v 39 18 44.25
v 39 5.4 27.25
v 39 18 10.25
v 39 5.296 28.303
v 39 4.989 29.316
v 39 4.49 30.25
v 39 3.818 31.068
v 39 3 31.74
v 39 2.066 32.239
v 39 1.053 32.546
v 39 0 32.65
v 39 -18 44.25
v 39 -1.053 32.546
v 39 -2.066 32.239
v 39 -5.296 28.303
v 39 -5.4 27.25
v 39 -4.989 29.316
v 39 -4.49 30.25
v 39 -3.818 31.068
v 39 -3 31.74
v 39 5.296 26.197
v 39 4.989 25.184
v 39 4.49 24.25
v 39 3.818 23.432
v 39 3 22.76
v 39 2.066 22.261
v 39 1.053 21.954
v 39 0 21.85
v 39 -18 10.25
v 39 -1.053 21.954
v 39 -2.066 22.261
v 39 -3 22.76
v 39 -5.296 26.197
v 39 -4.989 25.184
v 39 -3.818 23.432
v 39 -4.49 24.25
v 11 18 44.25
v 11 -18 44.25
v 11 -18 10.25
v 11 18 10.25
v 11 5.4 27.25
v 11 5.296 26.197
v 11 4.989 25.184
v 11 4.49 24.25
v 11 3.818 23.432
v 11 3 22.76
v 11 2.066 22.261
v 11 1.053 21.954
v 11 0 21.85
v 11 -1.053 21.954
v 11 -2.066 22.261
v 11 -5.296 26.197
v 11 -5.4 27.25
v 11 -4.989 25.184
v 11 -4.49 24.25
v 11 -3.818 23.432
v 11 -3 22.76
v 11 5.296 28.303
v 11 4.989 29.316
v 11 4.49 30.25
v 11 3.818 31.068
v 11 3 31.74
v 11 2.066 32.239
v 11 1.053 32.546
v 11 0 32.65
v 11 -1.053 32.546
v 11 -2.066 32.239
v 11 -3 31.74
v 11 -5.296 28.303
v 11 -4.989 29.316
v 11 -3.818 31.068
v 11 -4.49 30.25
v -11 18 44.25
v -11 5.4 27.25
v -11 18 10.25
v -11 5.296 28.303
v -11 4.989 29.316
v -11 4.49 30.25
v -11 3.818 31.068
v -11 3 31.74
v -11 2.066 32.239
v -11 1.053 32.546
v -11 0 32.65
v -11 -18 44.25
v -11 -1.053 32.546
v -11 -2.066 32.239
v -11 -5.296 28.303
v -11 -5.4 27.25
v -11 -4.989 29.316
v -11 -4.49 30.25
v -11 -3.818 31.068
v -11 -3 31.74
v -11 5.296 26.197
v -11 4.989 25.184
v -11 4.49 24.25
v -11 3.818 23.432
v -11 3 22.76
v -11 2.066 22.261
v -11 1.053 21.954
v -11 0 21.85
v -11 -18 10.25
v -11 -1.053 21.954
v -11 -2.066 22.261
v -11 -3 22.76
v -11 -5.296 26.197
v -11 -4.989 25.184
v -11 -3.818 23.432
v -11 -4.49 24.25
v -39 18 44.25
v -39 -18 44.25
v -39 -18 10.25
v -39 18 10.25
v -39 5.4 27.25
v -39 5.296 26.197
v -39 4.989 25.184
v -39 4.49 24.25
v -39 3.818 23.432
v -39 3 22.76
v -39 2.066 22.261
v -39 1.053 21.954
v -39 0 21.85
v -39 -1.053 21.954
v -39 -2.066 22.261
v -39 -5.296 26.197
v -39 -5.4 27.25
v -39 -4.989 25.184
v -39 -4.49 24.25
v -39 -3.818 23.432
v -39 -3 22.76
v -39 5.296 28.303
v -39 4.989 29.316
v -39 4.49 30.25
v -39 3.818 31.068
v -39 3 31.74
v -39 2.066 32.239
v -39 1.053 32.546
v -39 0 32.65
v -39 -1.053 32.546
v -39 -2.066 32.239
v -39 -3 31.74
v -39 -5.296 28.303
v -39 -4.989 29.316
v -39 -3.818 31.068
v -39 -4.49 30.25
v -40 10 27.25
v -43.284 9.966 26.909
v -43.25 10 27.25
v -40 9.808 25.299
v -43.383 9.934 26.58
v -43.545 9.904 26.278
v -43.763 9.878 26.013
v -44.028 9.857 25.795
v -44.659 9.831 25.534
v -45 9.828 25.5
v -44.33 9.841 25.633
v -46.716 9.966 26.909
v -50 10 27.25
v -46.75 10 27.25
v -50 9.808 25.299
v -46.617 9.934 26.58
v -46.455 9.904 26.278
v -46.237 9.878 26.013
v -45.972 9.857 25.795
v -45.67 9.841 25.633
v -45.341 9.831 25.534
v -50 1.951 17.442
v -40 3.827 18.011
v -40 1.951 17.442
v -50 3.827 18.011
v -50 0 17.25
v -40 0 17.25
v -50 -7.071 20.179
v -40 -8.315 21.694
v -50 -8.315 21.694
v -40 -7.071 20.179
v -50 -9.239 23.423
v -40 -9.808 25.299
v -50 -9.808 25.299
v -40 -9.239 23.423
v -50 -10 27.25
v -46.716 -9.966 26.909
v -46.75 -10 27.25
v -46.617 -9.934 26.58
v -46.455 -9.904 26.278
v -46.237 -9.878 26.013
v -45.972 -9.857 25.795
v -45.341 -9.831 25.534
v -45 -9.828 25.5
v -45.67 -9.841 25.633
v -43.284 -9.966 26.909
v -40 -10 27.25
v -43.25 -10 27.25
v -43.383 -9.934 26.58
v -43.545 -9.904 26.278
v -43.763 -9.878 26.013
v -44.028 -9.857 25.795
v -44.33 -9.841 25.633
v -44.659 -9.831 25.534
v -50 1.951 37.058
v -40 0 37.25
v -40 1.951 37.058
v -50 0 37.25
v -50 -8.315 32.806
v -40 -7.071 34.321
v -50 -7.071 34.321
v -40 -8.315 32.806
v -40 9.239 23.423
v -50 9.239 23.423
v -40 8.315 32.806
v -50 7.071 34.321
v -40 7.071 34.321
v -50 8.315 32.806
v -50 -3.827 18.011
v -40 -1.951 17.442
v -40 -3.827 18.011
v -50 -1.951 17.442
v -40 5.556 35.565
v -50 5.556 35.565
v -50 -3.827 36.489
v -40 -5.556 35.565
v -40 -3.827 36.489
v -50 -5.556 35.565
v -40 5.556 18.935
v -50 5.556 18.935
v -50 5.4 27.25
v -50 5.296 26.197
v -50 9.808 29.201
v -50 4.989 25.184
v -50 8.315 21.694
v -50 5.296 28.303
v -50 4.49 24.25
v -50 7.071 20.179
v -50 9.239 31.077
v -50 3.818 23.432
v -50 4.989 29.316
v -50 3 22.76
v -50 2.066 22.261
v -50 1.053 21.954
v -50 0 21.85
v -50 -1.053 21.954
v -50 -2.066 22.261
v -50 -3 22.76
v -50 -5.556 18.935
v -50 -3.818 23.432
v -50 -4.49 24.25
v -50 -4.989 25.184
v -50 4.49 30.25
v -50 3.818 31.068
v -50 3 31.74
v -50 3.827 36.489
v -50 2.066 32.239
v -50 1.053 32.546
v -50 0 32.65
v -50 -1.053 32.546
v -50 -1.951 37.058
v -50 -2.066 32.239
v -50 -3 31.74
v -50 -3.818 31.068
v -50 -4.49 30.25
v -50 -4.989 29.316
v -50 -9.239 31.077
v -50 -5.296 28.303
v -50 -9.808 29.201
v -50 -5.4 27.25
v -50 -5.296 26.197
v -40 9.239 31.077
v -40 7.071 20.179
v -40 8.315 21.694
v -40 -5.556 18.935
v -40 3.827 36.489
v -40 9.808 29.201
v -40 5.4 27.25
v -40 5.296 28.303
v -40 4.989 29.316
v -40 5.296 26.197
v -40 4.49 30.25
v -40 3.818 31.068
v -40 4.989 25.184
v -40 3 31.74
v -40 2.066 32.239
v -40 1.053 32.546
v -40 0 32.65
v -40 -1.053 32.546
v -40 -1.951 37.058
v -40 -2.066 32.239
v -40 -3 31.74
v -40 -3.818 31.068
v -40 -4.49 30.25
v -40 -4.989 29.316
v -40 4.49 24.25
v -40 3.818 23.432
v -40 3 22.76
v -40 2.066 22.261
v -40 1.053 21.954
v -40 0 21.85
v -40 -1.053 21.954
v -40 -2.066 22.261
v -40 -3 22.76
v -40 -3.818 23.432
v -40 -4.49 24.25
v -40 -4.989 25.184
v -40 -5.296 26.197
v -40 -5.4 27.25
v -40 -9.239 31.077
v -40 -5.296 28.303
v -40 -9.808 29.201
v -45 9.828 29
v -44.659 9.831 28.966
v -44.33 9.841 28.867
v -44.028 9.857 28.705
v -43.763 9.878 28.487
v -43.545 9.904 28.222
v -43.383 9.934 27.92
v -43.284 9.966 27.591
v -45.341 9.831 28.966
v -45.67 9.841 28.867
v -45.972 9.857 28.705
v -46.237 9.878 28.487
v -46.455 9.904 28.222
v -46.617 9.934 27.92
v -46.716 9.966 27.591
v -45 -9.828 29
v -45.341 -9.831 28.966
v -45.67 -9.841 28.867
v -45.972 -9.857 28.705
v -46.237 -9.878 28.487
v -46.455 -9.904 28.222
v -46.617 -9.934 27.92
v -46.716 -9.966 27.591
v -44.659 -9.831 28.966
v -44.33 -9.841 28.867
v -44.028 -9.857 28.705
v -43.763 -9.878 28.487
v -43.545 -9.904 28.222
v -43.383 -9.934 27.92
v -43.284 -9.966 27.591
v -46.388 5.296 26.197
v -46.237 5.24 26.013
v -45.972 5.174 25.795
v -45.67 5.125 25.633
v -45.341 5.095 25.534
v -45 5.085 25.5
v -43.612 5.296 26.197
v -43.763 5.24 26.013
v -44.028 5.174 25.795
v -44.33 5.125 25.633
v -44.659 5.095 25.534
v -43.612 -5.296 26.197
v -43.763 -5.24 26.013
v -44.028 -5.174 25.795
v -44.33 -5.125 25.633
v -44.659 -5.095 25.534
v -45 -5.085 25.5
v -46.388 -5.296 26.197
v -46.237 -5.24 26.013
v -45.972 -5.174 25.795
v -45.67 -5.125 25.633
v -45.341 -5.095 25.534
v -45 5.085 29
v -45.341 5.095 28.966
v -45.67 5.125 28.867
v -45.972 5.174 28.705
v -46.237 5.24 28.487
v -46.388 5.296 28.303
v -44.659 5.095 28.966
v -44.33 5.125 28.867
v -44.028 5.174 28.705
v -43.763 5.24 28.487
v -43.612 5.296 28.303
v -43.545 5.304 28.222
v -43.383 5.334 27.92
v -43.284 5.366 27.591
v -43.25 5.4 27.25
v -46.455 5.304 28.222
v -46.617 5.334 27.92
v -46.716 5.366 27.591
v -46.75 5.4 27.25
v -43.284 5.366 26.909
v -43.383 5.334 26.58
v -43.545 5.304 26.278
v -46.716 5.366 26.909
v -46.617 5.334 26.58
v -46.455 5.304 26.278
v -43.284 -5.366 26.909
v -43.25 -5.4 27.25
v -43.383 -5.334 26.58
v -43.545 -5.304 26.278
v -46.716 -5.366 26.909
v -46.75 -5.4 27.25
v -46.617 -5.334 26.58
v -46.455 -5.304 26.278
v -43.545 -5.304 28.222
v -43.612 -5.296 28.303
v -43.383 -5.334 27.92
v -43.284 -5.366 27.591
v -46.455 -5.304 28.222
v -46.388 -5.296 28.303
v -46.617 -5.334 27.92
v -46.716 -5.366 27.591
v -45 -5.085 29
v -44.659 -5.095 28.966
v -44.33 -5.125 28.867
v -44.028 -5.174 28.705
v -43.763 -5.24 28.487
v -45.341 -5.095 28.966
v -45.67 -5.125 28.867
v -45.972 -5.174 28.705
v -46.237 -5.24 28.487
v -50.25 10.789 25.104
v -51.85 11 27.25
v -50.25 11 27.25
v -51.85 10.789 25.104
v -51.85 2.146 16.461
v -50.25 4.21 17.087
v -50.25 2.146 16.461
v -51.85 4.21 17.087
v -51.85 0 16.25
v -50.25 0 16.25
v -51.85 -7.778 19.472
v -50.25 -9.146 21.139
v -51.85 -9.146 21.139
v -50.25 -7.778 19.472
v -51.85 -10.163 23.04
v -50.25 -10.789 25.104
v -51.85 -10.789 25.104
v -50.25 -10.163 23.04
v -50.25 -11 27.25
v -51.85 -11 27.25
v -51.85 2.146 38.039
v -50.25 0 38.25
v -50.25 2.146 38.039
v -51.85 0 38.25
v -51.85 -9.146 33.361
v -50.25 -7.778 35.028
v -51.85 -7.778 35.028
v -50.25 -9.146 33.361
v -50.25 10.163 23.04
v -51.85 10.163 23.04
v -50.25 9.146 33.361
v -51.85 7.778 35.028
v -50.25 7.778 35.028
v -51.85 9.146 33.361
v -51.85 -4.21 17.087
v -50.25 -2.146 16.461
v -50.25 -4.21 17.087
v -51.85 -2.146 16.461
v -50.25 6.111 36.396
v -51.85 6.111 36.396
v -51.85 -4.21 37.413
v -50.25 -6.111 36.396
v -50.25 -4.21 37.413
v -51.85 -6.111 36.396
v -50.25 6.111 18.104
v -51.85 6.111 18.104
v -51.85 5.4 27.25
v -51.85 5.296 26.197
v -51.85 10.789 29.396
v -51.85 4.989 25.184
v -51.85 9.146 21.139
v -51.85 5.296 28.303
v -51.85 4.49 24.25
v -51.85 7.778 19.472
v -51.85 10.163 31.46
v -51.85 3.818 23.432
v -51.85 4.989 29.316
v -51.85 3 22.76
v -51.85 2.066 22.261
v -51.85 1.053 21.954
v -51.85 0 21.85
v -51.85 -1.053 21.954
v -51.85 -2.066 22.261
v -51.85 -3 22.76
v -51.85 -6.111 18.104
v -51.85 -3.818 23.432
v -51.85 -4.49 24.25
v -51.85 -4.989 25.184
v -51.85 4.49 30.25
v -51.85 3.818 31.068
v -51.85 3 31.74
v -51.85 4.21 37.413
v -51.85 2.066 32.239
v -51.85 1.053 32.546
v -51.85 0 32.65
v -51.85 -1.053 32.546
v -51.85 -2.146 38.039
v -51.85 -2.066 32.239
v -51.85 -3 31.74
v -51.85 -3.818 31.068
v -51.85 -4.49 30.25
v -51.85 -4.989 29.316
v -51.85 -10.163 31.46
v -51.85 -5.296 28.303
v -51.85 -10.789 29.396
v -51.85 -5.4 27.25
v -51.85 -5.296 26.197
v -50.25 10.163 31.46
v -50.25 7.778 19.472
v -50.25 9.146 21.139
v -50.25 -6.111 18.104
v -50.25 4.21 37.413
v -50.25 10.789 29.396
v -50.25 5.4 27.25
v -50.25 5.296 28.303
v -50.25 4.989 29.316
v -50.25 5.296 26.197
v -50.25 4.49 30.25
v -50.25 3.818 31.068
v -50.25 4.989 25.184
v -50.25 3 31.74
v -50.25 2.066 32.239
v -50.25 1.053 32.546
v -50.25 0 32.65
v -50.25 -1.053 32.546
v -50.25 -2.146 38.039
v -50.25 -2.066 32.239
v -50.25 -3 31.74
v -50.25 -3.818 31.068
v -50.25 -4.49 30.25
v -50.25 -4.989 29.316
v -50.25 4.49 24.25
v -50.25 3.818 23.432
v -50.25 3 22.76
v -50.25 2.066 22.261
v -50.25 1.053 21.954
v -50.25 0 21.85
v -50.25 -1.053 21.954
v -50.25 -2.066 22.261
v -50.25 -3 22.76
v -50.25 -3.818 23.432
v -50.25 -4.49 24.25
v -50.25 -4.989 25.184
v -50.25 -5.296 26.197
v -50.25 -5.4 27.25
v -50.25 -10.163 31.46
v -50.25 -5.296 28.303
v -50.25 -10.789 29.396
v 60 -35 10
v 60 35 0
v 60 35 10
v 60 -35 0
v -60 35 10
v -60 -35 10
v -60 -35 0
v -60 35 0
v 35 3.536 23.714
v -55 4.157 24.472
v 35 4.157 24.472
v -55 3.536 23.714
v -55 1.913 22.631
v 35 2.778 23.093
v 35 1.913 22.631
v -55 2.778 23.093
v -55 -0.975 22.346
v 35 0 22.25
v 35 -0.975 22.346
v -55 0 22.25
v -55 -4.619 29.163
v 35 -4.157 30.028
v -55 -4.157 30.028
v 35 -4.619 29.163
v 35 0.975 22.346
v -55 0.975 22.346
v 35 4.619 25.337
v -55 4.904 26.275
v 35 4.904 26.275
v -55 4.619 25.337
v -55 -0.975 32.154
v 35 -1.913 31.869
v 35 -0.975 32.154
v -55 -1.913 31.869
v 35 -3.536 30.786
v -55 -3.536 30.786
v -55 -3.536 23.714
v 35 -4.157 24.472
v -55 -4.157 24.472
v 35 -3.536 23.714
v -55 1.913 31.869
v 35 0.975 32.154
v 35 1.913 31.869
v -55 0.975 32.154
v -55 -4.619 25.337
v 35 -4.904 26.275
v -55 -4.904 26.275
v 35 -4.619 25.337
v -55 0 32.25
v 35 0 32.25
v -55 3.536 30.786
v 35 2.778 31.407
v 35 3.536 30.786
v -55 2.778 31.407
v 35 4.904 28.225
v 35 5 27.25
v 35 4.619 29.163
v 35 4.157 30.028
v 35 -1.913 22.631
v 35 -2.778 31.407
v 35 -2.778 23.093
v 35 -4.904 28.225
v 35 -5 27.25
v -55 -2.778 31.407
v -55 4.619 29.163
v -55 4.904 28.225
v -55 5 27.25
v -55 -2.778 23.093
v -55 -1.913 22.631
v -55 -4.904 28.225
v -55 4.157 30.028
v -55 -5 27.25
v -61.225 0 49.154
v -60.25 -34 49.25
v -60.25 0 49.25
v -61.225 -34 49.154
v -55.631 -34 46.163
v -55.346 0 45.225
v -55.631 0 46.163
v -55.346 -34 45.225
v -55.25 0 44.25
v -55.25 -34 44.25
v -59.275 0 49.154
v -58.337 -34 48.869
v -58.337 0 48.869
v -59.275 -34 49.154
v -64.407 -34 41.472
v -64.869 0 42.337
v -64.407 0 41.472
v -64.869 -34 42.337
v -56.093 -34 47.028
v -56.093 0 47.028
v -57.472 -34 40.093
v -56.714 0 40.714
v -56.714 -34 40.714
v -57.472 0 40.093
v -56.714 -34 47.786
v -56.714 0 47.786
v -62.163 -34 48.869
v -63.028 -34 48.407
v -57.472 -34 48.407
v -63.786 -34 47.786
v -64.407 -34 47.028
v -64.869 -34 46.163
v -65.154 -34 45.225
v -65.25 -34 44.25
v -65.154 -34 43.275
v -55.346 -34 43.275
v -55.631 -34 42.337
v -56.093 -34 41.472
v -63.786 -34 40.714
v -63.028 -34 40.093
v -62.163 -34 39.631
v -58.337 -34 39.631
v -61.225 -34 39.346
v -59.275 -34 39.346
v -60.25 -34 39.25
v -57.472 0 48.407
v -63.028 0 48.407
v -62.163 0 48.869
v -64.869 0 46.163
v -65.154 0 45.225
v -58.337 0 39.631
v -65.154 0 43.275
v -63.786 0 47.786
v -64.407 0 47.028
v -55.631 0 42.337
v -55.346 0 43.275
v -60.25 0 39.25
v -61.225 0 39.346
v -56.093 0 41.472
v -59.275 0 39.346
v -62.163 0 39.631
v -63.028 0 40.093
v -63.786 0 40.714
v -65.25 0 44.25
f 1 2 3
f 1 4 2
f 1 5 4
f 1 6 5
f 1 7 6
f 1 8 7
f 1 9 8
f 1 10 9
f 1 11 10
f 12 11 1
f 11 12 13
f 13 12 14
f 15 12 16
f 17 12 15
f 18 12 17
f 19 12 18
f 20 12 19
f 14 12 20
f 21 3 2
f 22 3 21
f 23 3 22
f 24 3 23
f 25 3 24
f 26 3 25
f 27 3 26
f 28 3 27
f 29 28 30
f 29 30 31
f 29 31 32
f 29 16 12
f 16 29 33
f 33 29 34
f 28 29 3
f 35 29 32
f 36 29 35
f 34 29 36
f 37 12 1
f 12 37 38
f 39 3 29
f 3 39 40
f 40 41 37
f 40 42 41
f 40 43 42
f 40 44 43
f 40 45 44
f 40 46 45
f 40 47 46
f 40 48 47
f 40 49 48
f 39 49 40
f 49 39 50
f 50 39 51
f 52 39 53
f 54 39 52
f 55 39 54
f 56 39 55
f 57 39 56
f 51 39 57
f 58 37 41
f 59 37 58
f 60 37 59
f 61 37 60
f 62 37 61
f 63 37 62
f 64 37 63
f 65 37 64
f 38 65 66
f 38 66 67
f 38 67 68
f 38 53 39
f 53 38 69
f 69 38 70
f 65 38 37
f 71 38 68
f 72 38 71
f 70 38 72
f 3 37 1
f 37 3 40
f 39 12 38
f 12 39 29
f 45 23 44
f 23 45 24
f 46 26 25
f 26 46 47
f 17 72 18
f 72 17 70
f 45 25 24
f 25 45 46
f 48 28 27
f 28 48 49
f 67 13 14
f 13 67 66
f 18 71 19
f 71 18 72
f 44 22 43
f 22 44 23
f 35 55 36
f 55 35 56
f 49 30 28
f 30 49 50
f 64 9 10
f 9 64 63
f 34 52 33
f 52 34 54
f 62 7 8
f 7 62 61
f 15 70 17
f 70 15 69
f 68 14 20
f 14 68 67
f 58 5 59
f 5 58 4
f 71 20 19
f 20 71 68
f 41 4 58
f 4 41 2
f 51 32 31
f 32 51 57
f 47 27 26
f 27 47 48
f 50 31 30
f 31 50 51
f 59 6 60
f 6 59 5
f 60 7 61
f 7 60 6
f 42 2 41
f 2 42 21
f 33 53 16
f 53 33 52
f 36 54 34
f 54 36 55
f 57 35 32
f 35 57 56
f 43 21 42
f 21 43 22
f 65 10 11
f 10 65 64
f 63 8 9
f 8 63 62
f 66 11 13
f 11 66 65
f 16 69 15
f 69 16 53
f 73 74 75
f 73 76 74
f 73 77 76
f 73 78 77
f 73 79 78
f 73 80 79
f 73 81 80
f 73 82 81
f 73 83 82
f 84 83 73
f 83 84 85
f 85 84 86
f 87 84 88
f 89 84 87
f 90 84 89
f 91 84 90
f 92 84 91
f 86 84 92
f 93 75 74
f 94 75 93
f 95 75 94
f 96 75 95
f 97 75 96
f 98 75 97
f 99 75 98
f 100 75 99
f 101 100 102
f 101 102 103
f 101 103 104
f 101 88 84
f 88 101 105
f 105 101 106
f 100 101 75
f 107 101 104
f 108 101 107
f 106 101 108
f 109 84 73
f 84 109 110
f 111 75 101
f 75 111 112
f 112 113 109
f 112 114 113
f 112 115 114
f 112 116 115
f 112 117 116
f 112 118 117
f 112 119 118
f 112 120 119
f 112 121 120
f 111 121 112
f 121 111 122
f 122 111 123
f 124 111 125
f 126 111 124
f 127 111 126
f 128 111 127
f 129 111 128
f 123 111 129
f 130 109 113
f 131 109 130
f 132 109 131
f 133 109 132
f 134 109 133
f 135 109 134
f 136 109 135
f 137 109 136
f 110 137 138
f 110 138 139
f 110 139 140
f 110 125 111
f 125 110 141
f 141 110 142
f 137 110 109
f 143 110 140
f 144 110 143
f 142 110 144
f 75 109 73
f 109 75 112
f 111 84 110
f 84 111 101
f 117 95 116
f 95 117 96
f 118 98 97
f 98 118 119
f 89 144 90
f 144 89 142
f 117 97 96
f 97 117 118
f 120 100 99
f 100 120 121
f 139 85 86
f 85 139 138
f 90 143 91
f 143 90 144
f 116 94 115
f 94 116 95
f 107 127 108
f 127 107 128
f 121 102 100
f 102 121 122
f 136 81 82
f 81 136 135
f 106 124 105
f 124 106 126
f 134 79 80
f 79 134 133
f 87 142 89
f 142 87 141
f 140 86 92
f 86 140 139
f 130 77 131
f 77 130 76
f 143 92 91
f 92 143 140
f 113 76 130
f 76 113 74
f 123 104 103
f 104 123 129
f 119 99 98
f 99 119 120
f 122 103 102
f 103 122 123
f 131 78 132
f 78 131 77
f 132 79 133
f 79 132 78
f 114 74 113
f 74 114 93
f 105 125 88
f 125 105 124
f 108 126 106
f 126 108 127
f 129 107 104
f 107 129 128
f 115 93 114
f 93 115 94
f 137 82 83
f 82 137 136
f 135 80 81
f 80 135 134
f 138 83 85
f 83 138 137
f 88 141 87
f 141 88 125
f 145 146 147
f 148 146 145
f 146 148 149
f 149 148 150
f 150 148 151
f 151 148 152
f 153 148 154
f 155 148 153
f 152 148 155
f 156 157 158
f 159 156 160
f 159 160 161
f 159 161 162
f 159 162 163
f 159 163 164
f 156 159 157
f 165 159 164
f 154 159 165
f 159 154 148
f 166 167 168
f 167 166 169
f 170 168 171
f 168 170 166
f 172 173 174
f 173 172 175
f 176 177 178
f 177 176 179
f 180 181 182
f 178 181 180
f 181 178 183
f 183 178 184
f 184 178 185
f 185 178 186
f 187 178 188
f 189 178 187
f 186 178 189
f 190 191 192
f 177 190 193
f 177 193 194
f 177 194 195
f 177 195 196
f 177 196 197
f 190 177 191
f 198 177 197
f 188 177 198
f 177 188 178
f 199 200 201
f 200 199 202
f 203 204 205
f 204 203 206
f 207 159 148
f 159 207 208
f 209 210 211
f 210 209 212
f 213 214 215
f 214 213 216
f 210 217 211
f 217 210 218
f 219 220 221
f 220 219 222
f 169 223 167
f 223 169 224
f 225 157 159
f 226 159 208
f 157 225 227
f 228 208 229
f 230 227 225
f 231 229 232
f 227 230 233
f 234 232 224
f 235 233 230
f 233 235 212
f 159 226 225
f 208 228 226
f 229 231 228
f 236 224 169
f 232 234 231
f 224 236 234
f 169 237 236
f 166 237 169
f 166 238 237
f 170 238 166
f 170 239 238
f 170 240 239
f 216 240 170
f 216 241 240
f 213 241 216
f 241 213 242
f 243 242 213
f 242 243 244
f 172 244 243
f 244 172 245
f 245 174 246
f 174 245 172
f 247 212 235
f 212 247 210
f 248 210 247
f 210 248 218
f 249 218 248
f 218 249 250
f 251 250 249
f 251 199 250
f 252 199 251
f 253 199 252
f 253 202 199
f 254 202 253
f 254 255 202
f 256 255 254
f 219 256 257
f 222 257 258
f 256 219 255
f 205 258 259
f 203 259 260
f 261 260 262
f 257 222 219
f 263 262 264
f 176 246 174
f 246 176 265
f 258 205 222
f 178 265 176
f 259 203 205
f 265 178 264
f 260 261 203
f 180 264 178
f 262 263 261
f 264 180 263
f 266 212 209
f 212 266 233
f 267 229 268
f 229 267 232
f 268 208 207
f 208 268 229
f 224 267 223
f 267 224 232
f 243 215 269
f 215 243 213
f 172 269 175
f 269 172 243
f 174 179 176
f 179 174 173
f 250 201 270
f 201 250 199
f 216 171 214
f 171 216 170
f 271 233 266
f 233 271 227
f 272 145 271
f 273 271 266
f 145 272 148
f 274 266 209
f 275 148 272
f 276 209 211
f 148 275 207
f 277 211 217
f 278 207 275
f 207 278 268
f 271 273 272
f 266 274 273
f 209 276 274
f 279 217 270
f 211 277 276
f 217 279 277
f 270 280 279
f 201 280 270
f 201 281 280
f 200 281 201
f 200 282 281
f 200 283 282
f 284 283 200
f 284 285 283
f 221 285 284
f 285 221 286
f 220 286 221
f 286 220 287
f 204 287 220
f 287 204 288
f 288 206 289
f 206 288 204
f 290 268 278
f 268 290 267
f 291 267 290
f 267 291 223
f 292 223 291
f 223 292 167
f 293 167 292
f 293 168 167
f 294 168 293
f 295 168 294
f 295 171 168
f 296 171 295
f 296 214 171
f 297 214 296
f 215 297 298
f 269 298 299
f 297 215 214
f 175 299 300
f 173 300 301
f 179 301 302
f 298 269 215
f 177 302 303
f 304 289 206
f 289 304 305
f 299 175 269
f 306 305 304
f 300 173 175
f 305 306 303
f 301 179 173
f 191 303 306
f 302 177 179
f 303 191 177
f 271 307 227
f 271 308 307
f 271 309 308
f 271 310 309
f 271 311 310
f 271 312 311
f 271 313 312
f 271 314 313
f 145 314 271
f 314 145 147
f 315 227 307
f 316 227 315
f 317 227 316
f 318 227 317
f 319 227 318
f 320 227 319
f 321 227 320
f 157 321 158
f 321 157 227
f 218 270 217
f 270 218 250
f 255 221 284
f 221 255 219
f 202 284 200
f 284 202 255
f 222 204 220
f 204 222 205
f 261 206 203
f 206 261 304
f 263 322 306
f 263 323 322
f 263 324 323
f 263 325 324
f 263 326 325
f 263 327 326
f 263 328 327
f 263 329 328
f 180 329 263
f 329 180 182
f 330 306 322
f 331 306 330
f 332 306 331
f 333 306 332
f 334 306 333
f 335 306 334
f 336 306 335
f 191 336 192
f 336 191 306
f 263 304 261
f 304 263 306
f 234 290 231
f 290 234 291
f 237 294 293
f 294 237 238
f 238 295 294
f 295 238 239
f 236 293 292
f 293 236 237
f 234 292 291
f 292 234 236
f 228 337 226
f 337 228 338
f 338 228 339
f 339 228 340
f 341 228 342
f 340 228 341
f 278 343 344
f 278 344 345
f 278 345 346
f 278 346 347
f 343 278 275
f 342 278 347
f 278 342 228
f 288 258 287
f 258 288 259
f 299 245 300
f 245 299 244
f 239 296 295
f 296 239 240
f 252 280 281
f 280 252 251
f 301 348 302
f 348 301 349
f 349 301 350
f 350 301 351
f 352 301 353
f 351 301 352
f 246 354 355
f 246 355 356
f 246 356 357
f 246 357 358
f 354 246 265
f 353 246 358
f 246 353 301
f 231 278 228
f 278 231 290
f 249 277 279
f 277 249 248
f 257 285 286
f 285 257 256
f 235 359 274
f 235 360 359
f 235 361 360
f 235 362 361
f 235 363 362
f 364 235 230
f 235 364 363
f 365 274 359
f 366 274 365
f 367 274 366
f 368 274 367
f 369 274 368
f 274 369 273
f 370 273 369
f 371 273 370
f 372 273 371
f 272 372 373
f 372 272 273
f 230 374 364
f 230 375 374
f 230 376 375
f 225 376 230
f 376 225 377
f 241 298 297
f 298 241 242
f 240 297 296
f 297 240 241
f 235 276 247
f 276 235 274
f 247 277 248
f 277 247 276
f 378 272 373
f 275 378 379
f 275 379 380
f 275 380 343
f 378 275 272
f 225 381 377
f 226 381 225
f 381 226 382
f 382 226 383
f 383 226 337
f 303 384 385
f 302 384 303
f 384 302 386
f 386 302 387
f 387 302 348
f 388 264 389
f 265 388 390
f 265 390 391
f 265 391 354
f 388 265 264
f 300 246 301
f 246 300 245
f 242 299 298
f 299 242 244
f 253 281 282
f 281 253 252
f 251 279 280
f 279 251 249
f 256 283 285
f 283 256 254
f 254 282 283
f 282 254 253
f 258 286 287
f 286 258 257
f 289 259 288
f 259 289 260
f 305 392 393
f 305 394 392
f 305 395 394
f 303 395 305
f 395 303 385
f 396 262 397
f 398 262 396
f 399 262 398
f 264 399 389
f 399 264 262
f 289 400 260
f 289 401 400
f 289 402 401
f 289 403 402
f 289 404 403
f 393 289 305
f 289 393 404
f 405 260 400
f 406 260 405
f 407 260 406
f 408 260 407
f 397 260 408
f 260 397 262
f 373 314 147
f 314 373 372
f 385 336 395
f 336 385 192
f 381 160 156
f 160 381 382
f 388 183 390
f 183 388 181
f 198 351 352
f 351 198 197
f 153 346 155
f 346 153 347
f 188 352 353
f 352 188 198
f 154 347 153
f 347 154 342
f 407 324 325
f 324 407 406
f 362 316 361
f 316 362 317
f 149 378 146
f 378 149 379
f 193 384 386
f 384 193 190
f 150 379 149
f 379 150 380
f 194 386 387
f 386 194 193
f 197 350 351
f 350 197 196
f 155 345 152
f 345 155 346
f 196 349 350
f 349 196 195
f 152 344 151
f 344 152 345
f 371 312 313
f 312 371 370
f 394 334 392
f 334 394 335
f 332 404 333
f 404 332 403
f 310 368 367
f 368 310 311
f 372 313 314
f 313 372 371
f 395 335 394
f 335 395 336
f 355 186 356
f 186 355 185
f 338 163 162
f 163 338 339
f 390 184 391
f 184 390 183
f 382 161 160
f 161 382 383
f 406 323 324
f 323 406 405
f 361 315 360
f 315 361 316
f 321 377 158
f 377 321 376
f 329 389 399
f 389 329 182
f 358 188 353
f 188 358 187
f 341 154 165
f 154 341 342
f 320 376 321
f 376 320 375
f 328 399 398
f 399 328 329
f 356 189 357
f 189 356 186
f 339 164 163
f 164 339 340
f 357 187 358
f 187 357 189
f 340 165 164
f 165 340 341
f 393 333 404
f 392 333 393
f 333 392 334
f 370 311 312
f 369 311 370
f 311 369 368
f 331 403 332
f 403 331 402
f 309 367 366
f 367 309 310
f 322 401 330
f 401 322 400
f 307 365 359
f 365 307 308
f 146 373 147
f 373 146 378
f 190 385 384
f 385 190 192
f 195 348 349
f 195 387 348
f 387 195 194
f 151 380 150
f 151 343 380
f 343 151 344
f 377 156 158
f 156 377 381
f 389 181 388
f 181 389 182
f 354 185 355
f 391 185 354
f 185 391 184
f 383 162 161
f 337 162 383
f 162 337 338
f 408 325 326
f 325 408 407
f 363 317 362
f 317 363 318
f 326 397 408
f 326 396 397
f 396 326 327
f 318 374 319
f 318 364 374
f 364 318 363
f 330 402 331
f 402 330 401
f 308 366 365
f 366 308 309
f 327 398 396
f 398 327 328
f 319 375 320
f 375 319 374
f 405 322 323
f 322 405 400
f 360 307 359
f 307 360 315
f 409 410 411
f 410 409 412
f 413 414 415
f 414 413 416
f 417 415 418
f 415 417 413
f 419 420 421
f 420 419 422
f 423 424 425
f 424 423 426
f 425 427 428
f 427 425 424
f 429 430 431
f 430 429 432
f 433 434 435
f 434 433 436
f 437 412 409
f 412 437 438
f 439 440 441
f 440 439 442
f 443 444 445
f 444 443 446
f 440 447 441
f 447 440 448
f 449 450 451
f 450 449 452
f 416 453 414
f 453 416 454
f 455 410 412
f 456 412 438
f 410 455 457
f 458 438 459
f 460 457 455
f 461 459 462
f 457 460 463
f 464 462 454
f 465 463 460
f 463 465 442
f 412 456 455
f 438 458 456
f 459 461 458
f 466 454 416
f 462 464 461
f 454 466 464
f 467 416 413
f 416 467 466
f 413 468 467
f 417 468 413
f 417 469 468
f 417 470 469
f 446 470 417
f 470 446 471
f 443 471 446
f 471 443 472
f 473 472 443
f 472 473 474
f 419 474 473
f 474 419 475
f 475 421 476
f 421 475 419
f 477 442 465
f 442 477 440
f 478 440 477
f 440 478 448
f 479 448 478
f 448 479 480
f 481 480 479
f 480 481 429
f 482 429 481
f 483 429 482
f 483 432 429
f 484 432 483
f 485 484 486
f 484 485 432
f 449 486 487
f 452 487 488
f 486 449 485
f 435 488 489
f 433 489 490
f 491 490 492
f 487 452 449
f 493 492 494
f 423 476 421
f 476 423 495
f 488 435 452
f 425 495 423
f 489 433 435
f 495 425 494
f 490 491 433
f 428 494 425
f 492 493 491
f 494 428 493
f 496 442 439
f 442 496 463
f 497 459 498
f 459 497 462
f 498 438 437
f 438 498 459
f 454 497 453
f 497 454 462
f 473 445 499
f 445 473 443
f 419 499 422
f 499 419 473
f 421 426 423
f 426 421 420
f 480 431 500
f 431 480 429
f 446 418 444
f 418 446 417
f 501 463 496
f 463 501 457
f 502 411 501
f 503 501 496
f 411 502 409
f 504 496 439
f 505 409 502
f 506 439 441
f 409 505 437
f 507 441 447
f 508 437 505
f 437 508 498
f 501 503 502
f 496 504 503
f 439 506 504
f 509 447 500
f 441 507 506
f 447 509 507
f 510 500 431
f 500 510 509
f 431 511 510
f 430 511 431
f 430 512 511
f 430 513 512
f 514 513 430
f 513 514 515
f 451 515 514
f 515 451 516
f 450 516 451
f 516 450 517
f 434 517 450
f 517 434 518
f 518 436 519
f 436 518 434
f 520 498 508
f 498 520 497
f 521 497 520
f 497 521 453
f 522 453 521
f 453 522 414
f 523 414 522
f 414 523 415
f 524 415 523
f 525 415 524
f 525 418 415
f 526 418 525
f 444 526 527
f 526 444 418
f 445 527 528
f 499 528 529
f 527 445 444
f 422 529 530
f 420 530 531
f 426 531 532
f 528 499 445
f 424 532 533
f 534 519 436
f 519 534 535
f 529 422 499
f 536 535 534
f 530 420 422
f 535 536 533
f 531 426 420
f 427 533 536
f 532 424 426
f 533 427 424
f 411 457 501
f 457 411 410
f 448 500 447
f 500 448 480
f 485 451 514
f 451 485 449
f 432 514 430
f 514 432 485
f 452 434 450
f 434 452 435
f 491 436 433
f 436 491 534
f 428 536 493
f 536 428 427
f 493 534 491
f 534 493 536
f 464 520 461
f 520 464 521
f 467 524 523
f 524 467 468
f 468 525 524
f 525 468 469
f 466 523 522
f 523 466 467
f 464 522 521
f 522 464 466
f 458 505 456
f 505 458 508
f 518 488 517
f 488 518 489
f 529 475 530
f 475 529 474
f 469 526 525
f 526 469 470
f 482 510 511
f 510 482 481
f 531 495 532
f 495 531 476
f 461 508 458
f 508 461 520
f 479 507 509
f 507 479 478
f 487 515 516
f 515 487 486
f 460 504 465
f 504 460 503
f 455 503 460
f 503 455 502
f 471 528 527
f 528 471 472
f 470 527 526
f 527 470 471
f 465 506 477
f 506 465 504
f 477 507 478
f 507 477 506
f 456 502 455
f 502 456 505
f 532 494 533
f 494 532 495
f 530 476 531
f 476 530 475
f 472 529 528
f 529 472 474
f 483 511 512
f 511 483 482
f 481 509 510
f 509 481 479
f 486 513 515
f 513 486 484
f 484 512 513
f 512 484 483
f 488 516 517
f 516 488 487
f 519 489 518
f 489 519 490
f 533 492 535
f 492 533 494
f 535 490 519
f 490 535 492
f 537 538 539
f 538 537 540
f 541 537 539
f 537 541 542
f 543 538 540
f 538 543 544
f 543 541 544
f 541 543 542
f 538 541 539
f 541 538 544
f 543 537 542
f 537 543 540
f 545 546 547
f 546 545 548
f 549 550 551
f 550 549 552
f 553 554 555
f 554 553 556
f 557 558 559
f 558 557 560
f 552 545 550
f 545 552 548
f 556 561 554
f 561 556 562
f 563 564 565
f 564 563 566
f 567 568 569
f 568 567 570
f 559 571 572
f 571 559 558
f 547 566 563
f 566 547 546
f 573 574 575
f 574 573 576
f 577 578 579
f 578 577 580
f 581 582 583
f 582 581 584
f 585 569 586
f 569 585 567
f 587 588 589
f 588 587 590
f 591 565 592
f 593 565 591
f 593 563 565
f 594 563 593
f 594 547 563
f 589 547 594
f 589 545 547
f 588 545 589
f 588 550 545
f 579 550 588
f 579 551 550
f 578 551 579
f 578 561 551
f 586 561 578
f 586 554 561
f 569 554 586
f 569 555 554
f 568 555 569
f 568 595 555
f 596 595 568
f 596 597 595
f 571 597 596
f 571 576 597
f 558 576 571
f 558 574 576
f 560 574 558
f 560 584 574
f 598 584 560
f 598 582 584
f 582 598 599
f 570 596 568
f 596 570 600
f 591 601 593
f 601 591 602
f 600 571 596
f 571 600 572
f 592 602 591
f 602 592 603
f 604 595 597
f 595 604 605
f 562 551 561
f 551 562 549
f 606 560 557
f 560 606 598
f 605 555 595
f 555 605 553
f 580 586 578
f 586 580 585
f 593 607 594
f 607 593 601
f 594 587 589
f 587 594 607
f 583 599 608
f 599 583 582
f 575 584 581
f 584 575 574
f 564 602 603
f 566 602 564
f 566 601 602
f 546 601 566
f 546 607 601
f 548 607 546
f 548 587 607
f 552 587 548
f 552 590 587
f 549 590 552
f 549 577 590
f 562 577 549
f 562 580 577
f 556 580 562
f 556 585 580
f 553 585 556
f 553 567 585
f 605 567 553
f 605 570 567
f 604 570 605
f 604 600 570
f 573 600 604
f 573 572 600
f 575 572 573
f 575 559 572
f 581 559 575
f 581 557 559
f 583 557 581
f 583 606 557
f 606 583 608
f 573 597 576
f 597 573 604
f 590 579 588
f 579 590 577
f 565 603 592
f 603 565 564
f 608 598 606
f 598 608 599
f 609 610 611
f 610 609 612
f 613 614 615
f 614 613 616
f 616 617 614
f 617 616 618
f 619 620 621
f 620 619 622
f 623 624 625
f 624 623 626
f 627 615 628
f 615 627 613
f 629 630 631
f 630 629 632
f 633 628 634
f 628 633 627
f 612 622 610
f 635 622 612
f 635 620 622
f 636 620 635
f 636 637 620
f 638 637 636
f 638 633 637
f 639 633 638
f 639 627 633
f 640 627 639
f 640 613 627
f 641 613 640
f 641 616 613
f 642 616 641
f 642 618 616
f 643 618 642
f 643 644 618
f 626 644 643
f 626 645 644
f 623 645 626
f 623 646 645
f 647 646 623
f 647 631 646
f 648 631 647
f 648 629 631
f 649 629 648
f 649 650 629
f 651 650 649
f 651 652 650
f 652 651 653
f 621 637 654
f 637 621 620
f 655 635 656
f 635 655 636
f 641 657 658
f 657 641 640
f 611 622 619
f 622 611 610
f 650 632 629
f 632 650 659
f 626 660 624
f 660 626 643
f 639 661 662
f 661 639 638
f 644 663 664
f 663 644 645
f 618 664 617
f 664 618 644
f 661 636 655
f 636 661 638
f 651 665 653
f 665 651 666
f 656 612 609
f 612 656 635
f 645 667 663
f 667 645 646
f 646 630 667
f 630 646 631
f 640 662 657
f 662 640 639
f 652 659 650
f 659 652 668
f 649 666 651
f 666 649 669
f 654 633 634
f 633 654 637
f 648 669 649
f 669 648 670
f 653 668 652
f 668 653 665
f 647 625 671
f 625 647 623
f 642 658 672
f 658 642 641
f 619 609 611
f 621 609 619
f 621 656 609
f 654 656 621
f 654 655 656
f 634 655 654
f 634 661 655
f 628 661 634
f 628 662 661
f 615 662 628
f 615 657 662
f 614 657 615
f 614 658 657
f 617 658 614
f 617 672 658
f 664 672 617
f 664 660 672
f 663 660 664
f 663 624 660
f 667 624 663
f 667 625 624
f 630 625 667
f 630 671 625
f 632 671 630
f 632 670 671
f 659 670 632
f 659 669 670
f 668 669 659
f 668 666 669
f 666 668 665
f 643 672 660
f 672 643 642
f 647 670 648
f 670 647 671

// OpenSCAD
$fn = 32;

// ------------------------------------------------------------------------
// Machine vise: screw d10, jaws 28 x 34 mm
// Every part is its own module, assembly() places every instance.
// ------------------------------------------------------------------------

// --- part 1 ---
module vise_bed() {
  difference() {
    translate([-60, -35, 0]) cube([120, 70, 10]);
  }
}

// --- part 2 ---
module vise_jaw() {
  difference() {
    translate([-14, -18, 0]) cube([28, 36, 34]);
    translate([0, 0, 17]) rotate([0, 90, 0]) cylinder(h = 30, d = 10.8, center = true);
  }
}

// --- part 3 ---
module vise_screw() {
  translate([0, 0, -45]) cylinder(h = 90, d = 10);
}

// --- part 4 ---
module screw_collar() {
  difference() {
    cylinder(h = 10, d = 20);
    translate([0, 0, -1]) cylinder(h = 12, d = 10.8);
    translate([0, 0, 5]) rotate([90, 0, 0]) cylinder(h = 22, d = 3.5, center = true);
  }
}

// --- part 5 ---
module screw_washer() {
  difference() {
      translate([0, 0, 0]) cylinder(h = 1.6, d = 22);
      translate([0, 0, -1]) cylinder(h = 3.6, d = 10.8);
    }
}

// --- part 6 ---
module vise_handle() {
  cylinder(h = 34, d = 10);
}

// --- assembly ---
module assembly() {
  color([0.80, 0.24, 0.20]) translate([0, 0, 0]) rotate([0, 0, 0]) vise_bed();
  color([0.20, 0.45, 0.75]) translate([25, 0, 10.25]) rotate([0, 0, 0]) vise_jaw();
  color([0.25, 0.62, 0.32]) translate([-25, 0, 10.25]) rotate([0, 0, 0]) vise_jaw();
  color([0.92, 0.70, 0.18]) translate([-10, 0, 27.25]) rotate([0, 90, 0]) vise_screw();
  color([0.58, 0.35, 0.70]) translate([-50, 0, 27.25]) rotate([0, 90, 0]) screw_collar();
  color([0.16, 0.66, 0.66]) translate([-51.85, 0, 27.25]) rotate([0, 90, 0]) screw_washer();
  color([0.85, 0.48, 0.18]) translate([-60.25, 0, 44.25]) rotate([90, 0, 0]) vise_handle();
}

assembly();
